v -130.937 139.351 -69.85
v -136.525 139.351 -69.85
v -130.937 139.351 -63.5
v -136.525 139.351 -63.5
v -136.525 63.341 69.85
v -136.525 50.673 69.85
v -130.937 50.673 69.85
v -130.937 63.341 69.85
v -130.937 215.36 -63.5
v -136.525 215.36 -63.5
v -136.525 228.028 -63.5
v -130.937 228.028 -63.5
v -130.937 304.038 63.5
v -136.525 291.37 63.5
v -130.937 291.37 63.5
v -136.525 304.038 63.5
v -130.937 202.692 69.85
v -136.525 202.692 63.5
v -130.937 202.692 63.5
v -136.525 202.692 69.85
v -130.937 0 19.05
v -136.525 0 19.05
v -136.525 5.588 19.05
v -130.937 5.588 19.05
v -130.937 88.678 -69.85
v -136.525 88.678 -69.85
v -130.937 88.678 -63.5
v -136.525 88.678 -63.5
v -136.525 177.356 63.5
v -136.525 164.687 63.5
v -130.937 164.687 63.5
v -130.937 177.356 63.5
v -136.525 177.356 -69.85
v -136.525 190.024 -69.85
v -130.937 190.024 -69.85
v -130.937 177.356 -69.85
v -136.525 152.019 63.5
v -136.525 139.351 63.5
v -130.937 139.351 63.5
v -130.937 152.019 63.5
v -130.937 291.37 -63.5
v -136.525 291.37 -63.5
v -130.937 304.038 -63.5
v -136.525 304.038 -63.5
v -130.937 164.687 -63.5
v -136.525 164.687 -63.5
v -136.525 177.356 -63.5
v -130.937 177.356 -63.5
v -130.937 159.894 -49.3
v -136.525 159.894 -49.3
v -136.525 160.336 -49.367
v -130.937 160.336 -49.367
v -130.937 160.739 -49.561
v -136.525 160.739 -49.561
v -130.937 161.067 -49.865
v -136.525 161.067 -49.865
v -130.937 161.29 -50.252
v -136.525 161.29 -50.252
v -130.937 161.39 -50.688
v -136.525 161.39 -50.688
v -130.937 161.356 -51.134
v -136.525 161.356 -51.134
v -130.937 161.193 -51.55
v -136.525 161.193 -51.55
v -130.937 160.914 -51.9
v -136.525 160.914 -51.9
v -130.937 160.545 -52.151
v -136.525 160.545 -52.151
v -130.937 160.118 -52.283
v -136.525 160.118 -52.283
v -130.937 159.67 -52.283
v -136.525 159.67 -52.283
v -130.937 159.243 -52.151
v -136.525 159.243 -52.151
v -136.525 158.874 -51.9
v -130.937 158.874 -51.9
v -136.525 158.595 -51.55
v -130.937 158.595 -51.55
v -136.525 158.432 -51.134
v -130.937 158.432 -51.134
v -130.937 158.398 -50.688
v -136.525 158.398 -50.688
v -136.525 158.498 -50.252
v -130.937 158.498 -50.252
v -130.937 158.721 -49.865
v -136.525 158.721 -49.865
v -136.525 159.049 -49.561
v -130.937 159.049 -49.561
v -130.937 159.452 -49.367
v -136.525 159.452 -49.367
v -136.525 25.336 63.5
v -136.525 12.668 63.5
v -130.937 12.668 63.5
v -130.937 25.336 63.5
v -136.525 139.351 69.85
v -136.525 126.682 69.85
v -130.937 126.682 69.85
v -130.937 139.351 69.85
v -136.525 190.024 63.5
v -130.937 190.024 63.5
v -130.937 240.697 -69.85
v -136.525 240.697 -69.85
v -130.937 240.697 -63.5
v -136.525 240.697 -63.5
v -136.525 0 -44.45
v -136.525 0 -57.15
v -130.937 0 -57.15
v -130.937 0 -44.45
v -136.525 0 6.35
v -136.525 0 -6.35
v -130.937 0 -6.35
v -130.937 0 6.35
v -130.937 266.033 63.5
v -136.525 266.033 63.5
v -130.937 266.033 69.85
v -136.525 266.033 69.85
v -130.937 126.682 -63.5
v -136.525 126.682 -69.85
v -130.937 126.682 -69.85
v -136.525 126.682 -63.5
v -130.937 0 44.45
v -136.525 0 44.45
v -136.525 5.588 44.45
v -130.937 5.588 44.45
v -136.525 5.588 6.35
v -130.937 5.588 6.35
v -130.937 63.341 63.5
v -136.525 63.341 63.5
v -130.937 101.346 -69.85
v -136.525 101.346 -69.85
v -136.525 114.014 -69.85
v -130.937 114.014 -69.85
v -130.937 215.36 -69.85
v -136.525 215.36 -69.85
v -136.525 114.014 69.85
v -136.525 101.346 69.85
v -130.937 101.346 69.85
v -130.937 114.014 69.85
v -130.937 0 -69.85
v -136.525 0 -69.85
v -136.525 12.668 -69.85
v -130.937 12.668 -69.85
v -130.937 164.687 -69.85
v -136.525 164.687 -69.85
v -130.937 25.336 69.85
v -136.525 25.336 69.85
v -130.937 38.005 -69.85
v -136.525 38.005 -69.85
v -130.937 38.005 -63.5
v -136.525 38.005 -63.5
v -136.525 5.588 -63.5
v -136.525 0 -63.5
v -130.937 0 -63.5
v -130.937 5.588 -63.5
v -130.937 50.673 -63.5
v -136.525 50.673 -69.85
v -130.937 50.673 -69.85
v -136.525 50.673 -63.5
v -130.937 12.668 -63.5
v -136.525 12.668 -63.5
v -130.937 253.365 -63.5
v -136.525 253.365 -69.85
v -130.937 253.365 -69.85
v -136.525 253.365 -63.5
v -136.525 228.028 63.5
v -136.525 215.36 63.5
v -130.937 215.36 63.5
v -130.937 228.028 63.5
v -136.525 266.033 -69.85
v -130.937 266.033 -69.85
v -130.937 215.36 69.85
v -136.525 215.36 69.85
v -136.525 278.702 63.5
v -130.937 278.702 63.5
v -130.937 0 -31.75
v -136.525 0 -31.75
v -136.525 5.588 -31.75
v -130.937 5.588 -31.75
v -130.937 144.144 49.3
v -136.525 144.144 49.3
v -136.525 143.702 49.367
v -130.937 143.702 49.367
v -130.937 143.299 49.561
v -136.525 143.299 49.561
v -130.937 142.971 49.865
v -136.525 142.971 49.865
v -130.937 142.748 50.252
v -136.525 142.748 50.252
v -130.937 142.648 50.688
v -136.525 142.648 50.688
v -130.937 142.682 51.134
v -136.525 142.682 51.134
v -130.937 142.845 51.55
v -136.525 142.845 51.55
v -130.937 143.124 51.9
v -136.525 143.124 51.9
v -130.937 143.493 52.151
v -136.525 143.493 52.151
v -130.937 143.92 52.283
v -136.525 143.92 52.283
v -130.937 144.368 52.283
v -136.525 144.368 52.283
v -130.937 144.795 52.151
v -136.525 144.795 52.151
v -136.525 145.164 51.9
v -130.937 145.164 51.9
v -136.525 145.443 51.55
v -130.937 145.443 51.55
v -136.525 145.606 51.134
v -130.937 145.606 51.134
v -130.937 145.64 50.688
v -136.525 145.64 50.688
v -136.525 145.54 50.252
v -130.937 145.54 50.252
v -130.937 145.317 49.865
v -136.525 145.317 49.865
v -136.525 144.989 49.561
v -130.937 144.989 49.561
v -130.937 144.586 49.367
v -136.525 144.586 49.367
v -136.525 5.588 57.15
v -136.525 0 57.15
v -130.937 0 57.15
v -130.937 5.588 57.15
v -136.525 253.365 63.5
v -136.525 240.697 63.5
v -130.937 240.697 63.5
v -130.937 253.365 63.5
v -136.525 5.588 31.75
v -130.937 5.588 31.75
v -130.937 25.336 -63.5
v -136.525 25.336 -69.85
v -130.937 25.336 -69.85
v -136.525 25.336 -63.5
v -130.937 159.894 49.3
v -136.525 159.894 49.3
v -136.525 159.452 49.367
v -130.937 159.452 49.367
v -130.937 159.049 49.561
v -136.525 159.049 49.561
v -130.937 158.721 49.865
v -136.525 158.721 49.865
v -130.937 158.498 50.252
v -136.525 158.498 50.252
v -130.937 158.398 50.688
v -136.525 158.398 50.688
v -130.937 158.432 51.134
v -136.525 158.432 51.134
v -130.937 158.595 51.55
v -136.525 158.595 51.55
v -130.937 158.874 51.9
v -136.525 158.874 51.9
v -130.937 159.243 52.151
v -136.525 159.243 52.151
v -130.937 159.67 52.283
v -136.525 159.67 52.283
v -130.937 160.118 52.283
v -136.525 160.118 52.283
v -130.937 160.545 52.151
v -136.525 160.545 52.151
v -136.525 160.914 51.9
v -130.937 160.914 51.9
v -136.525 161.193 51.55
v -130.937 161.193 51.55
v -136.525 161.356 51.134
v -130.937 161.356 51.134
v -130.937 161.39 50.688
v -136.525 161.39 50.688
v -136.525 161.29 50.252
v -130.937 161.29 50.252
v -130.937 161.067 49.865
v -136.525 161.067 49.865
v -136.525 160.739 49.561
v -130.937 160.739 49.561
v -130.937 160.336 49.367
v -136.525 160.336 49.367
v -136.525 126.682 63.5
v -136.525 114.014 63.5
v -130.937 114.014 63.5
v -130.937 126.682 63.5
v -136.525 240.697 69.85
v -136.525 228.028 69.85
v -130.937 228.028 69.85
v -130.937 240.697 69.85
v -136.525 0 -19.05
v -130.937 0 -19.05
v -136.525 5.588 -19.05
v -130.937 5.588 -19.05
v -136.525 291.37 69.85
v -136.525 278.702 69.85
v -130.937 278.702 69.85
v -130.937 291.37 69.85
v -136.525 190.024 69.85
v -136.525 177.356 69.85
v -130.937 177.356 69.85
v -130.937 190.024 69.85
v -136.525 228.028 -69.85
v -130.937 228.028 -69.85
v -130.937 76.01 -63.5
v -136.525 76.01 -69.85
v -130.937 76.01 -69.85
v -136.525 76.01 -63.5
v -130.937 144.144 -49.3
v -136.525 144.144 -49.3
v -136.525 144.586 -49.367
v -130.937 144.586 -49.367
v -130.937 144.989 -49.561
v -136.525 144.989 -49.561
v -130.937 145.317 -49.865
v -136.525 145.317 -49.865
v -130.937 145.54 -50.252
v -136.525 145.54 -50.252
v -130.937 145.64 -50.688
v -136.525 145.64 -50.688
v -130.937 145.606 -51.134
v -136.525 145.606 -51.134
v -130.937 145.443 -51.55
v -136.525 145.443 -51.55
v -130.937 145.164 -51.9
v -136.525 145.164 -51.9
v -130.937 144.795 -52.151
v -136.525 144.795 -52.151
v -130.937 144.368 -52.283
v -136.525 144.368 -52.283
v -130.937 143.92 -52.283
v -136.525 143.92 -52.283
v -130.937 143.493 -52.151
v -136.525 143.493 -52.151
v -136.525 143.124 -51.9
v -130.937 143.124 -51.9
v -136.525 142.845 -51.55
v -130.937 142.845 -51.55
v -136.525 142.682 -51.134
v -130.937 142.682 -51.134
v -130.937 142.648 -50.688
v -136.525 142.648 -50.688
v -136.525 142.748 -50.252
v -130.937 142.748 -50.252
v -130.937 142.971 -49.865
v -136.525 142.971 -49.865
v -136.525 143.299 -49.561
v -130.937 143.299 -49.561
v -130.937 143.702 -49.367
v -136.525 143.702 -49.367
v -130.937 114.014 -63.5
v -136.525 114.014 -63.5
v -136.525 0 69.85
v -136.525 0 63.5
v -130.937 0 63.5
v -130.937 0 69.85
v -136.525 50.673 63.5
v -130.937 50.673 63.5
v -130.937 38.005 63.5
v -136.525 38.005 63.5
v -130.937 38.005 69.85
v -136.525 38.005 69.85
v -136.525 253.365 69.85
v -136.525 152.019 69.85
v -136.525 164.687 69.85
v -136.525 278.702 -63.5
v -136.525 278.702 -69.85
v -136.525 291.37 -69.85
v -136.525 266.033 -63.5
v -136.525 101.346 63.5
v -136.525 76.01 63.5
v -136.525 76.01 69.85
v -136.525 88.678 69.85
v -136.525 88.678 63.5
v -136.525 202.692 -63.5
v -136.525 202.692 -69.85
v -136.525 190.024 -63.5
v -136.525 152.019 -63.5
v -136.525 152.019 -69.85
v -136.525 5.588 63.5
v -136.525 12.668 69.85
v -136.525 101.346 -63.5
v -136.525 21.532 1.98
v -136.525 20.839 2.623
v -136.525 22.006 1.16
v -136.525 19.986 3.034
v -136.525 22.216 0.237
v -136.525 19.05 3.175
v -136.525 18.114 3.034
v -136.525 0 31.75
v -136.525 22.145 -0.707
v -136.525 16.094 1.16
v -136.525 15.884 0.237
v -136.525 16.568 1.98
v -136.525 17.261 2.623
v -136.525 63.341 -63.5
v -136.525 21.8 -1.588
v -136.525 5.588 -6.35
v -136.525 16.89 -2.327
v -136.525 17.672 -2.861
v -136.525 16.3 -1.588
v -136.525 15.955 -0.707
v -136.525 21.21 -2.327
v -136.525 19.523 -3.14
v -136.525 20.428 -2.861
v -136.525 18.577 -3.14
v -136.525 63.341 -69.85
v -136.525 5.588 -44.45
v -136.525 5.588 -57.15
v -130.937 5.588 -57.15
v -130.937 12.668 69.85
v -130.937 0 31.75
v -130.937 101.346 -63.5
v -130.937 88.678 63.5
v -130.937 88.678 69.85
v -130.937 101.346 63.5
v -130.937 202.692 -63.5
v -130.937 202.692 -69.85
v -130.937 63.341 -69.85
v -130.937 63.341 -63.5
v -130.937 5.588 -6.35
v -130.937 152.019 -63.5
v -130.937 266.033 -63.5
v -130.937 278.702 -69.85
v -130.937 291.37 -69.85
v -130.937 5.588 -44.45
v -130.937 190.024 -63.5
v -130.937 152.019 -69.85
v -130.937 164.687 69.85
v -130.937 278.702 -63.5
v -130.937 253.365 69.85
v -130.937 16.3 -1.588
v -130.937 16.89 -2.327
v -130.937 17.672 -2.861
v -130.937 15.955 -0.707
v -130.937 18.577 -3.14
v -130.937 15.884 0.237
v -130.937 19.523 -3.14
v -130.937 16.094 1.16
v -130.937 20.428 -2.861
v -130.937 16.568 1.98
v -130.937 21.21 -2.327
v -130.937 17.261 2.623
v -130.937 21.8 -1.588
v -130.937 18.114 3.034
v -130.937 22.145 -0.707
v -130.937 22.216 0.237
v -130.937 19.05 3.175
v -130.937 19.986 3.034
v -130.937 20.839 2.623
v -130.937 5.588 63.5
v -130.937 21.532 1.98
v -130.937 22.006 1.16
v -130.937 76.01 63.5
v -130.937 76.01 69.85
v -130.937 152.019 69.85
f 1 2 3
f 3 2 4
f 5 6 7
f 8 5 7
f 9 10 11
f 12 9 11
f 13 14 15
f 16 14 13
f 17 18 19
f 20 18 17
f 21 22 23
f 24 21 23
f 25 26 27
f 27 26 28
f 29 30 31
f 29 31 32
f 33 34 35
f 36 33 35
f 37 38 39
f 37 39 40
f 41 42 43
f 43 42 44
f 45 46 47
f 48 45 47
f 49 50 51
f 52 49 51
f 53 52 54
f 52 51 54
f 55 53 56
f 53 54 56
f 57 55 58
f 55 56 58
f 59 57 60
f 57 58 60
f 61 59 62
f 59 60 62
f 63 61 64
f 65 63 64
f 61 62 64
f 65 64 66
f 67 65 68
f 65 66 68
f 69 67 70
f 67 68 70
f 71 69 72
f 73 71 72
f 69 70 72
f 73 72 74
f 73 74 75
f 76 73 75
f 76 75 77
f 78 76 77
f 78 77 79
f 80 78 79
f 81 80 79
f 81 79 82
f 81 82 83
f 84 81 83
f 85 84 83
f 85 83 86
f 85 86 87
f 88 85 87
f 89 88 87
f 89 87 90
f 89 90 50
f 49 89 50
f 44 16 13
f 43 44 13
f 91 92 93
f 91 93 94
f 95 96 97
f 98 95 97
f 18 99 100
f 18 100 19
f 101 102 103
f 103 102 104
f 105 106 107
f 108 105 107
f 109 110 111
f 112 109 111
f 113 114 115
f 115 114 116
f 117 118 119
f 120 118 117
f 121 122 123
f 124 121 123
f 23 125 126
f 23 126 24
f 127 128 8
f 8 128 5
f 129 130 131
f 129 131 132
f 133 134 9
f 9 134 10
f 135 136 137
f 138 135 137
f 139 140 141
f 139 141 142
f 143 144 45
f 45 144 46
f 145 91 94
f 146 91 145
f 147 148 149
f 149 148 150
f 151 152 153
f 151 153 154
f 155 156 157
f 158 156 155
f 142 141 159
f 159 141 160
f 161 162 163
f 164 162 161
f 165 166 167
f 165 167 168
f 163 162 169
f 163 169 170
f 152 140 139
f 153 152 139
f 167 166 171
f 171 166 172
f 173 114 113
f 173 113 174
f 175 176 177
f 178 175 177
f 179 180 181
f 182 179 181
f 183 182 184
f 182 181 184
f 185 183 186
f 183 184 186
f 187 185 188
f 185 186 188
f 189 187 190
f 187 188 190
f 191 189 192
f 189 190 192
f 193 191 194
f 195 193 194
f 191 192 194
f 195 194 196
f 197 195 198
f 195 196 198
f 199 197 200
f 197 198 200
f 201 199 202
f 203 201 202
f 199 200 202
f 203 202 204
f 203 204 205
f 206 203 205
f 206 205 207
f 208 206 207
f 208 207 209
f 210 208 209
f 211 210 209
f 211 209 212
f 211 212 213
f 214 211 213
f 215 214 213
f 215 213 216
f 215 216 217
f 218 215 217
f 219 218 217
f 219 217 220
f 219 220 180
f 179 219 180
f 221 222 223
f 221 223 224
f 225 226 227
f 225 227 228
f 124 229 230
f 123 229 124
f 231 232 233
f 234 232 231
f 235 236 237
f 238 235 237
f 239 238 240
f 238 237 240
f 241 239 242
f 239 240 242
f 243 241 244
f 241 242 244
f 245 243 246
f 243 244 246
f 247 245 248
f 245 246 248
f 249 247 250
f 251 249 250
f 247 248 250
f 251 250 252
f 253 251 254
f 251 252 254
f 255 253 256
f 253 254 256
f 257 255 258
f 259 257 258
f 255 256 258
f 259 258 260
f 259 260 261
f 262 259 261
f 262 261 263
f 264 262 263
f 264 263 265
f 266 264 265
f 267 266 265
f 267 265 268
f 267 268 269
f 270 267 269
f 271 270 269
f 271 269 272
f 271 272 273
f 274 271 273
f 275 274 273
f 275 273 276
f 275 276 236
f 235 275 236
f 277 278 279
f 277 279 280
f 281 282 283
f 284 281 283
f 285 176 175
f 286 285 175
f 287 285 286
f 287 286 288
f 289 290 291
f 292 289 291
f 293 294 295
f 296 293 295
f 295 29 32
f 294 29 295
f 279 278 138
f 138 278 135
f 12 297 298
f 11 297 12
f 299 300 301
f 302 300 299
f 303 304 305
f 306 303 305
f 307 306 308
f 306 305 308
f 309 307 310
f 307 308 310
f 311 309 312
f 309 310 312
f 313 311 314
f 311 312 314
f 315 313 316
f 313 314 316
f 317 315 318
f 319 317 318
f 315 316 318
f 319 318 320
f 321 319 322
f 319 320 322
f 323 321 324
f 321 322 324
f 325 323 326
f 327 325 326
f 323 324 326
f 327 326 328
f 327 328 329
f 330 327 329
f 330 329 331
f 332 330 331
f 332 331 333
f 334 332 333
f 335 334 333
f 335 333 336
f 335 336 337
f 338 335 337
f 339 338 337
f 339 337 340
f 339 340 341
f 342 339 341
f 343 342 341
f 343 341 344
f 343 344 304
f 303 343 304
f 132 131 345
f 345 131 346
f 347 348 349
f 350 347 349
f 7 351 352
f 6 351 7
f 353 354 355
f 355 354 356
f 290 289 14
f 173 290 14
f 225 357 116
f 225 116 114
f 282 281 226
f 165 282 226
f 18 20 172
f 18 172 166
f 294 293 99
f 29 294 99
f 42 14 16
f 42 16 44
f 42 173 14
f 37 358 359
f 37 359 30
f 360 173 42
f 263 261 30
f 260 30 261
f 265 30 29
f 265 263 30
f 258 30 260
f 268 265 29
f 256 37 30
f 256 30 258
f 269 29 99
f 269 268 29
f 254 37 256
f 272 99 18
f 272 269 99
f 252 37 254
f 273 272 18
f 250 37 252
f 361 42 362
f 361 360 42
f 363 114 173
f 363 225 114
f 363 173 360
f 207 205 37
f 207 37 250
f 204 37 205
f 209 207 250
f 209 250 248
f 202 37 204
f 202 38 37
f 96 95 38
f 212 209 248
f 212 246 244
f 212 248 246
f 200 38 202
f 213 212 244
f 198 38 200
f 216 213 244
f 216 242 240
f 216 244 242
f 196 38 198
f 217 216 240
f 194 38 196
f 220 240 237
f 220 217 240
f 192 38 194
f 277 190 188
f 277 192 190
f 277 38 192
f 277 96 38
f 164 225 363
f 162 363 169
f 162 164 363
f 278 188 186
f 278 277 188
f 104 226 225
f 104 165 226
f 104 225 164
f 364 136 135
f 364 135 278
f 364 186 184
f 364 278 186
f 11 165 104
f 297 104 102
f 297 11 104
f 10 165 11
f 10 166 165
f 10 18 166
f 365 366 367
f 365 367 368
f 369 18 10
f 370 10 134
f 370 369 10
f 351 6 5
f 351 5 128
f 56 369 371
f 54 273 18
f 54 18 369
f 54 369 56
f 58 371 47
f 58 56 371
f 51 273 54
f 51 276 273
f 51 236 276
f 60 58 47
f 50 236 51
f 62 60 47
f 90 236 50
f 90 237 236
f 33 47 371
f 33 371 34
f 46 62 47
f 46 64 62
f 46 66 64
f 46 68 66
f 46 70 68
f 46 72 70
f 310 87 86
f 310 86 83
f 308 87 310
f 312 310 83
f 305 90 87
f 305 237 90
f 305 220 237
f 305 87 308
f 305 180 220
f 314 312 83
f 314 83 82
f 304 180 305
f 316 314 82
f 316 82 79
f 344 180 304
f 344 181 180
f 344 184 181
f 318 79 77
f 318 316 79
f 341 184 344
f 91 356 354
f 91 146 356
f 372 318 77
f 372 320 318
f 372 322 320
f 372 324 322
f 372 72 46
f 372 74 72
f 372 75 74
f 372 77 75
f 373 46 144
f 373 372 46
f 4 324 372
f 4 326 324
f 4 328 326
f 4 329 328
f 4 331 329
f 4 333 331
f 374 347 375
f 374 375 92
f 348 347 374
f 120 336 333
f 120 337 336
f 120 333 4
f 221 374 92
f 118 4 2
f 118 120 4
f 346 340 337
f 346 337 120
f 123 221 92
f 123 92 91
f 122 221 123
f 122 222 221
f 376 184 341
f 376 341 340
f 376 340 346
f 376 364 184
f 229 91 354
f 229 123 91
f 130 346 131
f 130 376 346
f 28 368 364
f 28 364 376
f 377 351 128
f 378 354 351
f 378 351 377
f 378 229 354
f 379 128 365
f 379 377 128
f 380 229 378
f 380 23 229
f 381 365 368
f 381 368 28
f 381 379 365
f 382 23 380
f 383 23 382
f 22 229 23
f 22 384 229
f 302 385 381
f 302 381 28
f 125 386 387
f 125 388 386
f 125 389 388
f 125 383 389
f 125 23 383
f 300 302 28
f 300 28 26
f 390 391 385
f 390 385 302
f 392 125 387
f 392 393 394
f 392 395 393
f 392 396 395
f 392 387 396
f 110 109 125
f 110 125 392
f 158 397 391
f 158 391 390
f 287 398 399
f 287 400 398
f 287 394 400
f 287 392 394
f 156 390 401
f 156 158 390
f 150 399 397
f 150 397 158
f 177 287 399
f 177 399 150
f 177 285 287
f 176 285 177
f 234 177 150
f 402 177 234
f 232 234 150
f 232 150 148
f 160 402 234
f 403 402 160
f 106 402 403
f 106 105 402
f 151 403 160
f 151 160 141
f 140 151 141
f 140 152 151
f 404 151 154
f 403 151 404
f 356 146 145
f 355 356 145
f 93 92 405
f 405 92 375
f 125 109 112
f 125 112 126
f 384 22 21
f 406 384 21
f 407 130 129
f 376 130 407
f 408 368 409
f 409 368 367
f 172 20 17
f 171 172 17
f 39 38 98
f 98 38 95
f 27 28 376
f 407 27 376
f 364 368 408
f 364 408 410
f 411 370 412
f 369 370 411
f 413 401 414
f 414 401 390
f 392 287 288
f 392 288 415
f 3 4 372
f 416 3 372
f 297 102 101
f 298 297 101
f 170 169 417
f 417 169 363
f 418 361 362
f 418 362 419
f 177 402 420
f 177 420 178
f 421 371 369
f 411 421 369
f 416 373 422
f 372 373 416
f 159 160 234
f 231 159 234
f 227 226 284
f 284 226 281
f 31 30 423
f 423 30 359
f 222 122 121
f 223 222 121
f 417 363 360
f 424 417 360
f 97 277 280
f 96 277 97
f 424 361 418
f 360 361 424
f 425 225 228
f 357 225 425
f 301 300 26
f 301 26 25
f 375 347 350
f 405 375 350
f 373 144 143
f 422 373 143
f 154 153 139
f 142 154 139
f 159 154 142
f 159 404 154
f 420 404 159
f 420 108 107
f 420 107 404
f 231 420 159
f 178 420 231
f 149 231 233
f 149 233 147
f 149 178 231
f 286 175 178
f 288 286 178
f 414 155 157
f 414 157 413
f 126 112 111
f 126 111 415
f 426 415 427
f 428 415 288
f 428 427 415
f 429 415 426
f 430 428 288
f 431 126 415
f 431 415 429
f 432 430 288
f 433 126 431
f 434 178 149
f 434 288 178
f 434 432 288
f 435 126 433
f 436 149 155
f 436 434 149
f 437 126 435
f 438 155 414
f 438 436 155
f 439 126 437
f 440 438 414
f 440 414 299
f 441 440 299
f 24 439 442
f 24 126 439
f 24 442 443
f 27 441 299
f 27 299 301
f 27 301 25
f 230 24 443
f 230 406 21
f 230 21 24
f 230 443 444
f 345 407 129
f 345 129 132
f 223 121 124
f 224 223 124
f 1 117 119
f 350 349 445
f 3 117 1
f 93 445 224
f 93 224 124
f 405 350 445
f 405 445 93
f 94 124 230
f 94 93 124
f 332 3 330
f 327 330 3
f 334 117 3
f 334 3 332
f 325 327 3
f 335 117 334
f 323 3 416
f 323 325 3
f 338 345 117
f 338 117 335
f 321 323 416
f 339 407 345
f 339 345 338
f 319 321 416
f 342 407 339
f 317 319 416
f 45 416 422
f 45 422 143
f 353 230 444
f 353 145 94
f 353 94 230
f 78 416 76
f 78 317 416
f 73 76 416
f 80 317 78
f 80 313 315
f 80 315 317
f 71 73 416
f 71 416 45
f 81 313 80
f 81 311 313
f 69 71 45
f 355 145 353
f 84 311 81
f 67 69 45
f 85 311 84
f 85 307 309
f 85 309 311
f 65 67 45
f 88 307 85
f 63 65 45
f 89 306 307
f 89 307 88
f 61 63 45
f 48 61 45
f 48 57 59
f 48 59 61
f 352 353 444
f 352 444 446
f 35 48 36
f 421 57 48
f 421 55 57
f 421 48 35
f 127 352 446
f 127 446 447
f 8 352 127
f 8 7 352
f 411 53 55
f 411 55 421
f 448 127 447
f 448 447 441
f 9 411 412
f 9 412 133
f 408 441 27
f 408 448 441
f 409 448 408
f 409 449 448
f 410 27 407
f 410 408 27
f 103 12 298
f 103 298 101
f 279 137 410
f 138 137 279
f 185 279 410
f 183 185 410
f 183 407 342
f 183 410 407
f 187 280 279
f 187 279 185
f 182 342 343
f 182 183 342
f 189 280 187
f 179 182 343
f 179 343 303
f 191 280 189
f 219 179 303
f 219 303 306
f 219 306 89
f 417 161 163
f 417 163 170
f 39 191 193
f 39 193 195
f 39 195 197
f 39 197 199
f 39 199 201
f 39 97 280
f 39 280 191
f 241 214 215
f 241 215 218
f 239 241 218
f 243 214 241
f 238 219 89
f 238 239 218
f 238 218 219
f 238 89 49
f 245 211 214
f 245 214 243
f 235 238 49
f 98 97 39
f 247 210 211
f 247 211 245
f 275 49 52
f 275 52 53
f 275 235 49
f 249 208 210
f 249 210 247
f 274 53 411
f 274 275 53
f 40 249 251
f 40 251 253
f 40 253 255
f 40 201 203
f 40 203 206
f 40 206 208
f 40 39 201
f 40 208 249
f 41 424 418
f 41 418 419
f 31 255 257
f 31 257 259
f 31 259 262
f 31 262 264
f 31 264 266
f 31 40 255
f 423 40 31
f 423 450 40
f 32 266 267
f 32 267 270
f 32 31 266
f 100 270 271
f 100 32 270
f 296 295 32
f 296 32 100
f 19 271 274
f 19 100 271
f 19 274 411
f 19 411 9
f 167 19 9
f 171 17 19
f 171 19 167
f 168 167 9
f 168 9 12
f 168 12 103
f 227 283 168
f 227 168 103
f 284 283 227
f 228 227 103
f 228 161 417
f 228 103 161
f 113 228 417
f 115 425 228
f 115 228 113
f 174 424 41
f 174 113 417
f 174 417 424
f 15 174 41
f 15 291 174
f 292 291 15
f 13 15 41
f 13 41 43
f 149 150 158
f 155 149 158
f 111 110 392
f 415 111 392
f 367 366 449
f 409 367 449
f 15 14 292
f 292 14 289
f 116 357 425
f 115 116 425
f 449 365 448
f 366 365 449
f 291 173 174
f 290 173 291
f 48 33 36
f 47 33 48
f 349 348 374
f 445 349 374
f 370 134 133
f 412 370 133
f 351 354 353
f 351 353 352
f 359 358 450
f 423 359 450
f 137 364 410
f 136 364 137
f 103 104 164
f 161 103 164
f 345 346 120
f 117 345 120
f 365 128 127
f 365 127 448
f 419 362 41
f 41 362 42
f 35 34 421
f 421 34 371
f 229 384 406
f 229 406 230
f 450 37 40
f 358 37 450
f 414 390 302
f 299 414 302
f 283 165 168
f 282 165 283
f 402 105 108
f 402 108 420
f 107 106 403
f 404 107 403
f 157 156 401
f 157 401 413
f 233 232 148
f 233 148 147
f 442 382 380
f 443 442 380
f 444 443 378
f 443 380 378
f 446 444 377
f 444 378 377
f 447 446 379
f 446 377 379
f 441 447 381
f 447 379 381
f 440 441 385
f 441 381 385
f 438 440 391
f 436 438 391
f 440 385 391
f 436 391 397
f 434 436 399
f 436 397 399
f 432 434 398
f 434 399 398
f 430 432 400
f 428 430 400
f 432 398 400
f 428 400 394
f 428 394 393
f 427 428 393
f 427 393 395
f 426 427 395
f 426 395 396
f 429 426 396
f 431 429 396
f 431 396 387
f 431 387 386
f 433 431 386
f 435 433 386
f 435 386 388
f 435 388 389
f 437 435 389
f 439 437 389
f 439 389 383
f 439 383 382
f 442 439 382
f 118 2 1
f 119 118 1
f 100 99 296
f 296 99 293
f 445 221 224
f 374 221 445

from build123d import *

# Parameters (mm, degrees)
SKETCH1_W              = 273.05
SKETCH1_H              = 139.7
BOSS_EXTRUDE1_DEPTH    = 5.588
SKETCH2_W              = 273.05
SKETCH2_H              = 139.7
SKETCH2_W_2            = 261.874
SKETCH2_H_2            = 128.524
BOSS_EXTRUDE2_DEPTH    = 298.45
SKETCH3_W              = 6.35
SKETCH3_H              = 16.933333333
SKETCH3_H_2            = 16.933333334
DOOR_SLOT_DEPTH        = 12.7
DOOR_GUIDE_HOLES_REACH = 361.255
SKETCH4_W              = 6.35
SKETCH4_H              = 15.875
LEVER_HOLES_W          = 9.652
LEVER_HOLES_H          = 6.35
LEVER_HOLES_W_2        = 6.35
CUT_EXTRUDE1_DEPTH     = 362.378293578
CUT_EXTRUDE2_REACH     = 416.577
SKETCH7_R              = 26.9875
CUT_EXTRUDE3_REACH     = 416.577
SKETCH8_R              = 3.175
SKETCH8_R_2            = 1.5
SKETCH16_W             = 336.893526087
SKETCH16_H             = 314.471565403
CUT_EXTRUDE10_DEPTH    = 362.378293578
LEFT_RIGHT_W           = 6.35
LEFT_RIGHT_H           = 5.588
LEFT_RIGHT_W_2         = 12.7
LEFT_RIGHT_H_2         = 12.66825
CUT_EXTRUDE11_DEPTH    = 313.00857951


with BuildPart() as part:
    # Sketch1 → Boss-Extrude1 (new body)
    with BuildSketch(Plane(origin=(0, 0, 0), x_dir=(1, 0, 0), z_dir=(0, 1, 0))):
        Rectangle(SKETCH1_W, SKETCH1_H)
    extrude(amount=BOSS_EXTRUDE1_DEPTH)

    # Sketch2 → Boss-Extrude2 (add)
    with BuildSketch(Plane(origin=(0, 5.588, 0), x_dir=(1, 0, 0), z_dir=(0, 1, 0))):
        Rectangle(SKETCH2_W, SKETCH2_H)
        Rectangle(SKETCH2_W_2, SKETCH2_H_2, mode=Mode.SUBTRACT)
    extrude(amount=BOSS_EXTRUDE2_DEPTH)

    # Sketch3 → Door Slot (cut)
    with BuildSketch(Plane.XY.offset(69.85)):
        with BuildLine():
            Line((-29.337, 282.448), (-29.337, 5.588))
            Line((-29.337, 5.588), (-22.733, 5.588))
            Line((-22.733, 5.588), (-22.733, 291.592))
            Line((-22.733, 291.592), (-42.291, 291.592))
            Line((-42.291, 291.592), (-42.291, 284.988))
            Line((-42.291, 284.988), (-31.877, 284.988))
            ThreePointArc((-31.877, 284.988), (-30.080948776, 284.244051224), (-29.337, 282.448))
        make_face()
        with Locations((-13.208, 80.433333334)):
            Rectangle(SKETCH3_W, SKETCH3_H)
        with Locations((-13.208, 50.8)):
            Rectangle(SKETCH3_W, SKETCH3_H_2)
        with Locations((-13.208, 21.166666667)):
            Rectangle(SKETCH3_W, SKETCH3_H)
    extrude(amount=-DOOR_SLOT_DEPTH, mode=Mode.SUBTRACT)

    # Sketch4 → Door Guide Holes (cut, up to next)
    with BuildSketch(Plane.XY.offset(-64.262), mode=Mode.PRIVATE) as door_guide_holes_sk1:
        with Locations((-45.466, 283.4005)):
            Rectangle(SKETCH4_W, SKETCH4_H)
    door_guide_holes_tool1 = extrude(door_guide_holes_sk1.sketch, amount=-DOOR_GUIDE_HOLES_REACH, mode=Mode.PRIVATE) & part.part
    # Sketch4 → Door Guide Holes (cut, up to next)
    with BuildSketch(Plane.XY.offset(-64.262), mode=Mode.PRIVATE) as door_guide_holes_sk2:
        with Locations((-45.466, 254.8255)):
            Rectangle(SKETCH4_W, SKETCH4_H)
    door_guide_holes_tool2 = extrude(door_guide_holes_sk2.sketch, amount=-DOOR_GUIDE_HOLES_REACH, mode=Mode.PRIVATE) & part.part
    # Sketch4 → Door Guide Holes (cut, up to next)
    with BuildSketch(Plane.XY.offset(-64.262), mode=Mode.PRIVATE) as door_guide_holes_sk3:
        with Locations((-45.466, 226.2505)):
            Rectangle(SKETCH4_W, SKETCH4_H)
    door_guide_holes_tool3 = extrude(door_guide_holes_sk3.sketch, amount=-DOOR_GUIDE_HOLES_REACH, mode=Mode.PRIVATE) & part.part
    # Sketch4 → Door Guide Holes (cut, up to next)
    with BuildSketch(Plane.XY.offset(-64.262), mode=Mode.PRIVATE) as door_guide_holes_sk4:
        with Locations((-45.466, 197.6755)):
            Rectangle(SKETCH4_W, SKETCH4_H)
    door_guide_holes_tool4 = extrude(door_guide_holes_sk4.sketch, amount=-DOOR_GUIDE_HOLES_REACH, mode=Mode.PRIVATE) & part.part
    # Sketch4 → Door Guide Holes (cut, up to next)
    with BuildSketch(Plane.XY.offset(-64.262), mode=Mode.PRIVATE) as door_guide_holes_sk5:
        with Locations((-45.466, 169.1005)):
            Rectangle(SKETCH4_W, SKETCH4_H)
    door_guide_holes_tool5 = extrude(door_guide_holes_sk5.sketch, amount=-DOOR_GUIDE_HOLES_REACH, mode=Mode.PRIVATE) & part.part
    # Sketch4 → Door Guide Holes (cut, up to next)
    with BuildSketch(Plane.XY.offset(-64.262), mode=Mode.PRIVATE) as door_guide_holes_sk6:
        with Locations((-45.466, 140.5255)):
            Rectangle(SKETCH4_W, SKETCH4_H)
    door_guide_holes_tool6 = extrude(door_guide_holes_sk6.sketch, amount=-DOOR_GUIDE_HOLES_REACH, mode=Mode.PRIVATE) & part.part
    # Sketch4 → Door Guide Holes (cut, up to next)
    with BuildSketch(Plane.XY.offset(-64.262), mode=Mode.PRIVATE) as door_guide_holes_sk7:
        with Locations((-45.466, 111.9505)):
            Rectangle(SKETCH4_W, SKETCH4_H)
    door_guide_holes_tool7 = extrude(door_guide_holes_sk7.sketch, amount=-DOOR_GUIDE_HOLES_REACH, mode=Mode.PRIVATE) & part.part
    # Sketch4 → Door Guide Holes (cut, up to next)
    with BuildSketch(Plane.XY.offset(-64.262), mode=Mode.PRIVATE) as door_guide_holes_sk8:
        with Locations((-45.466, 83.3755)):
            Rectangle(SKETCH4_W, SKETCH4_H)
    door_guide_holes_tool8 = extrude(door_guide_holes_sk8.sketch, amount=-DOOR_GUIDE_HOLES_REACH, mode=Mode.PRIVATE) & part.part
    # Sketch4 → Door Guide Holes (cut, up to next)
    with BuildSketch(Plane.XY.offset(-64.262), mode=Mode.PRIVATE) as door_guide_holes_sk9:
        with Locations((-45.466, 54.8005)):
            Rectangle(SKETCH4_W, SKETCH4_H)
    door_guide_holes_tool9 = extrude(door_guide_holes_sk9.sketch, amount=-DOOR_GUIDE_HOLES_REACH, mode=Mode.PRIVATE) & part.part
    # Sketch4 → Door Guide Holes (cut, up to next)
    with BuildSketch(Plane.XY.offset(-64.262), mode=Mode.PRIVATE) as door_guide_holes_sk10:
        with Locations((-45.466, 26.2255)):
            Rectangle(SKETCH4_W, SKETCH4_H)
    door_guide_holes_tool10 = extrude(door_guide_holes_sk10.sketch, amount=-DOOR_GUIDE_HOLES_REACH, mode=Mode.PRIVATE) & part.part
    door_guide_holes_1 = door_guide_holes_tool1.solids().sort_by_distance((-45.466, 283.4005, -64.262))[0]
    add(door_guide_holes_1, mode=Mode.SUBTRACT)
    door_guide_holes_2 = door_guide_holes_tool2.solids().sort_by_distance((-45.466, 254.8255, -64.262))[0]
    add(door_guide_holes_2, mode=Mode.SUBTRACT)
    door_guide_holes_3 = door_guide_holes_tool3.solids().sort_by_distance((-45.466, 226.2505, -64.262))[0]
    add(door_guide_holes_3, mode=Mode.SUBTRACT)
    door_guide_holes_4 = door_guide_holes_tool4.solids().sort_by_distance((-45.466, 197.6755, -64.262))[0]
    add(door_guide_holes_4, mode=Mode.SUBTRACT)
    door_guide_holes_5 = door_guide_holes_tool5.solids().sort_by_distance((-45.466, 169.1005, -64.262))[0]
    add(door_guide_holes_5, mode=Mode.SUBTRACT)
    door_guide_holes_6 = door_guide_holes_tool6.solids().sort_by_distance((-45.466, 140.5255, -64.262))[0]
    add(door_guide_holes_6, mode=Mode.SUBTRACT)
    door_guide_holes_7 = door_guide_holes_tool7.solids().sort_by_distance((-45.466, 111.9505, -64.262))[0]
    add(door_guide_holes_7, mode=Mode.SUBTRACT)
    door_guide_holes_8 = door_guide_holes_tool8.solids().sort_by_distance((-45.466, 83.3755, -64.262))[0]
    add(door_guide_holes_8, mode=Mode.SUBTRACT)
    door_guide_holes_9 = door_guide_holes_tool9.solids().sort_by_distance((-45.466, 54.8005, -64.262))[0]
    add(door_guide_holes_9, mode=Mode.SUBTRACT)
    door_guide_holes_10 = door_guide_holes_tool10.solids().sort_by_distance((-45.466, 26.2255, -64.262))[0]
    add(door_guide_holes_10, mode=Mode.SUBTRACT)
    door_guide_holes = door_guide_holes_1 + door_guide_holes_2 + door_guide_holes_3 + door_guide_holes_4 + door_guide_holes_5 + door_guide_holes_6 + door_guide_holes_7 + door_guide_holes_8 + door_guide_holes_9 + door_guide_holes_10  # Door Guide Holes as one shape, for the pattern or mirror that repeats it

    # Mirror1: Door Guide Holes across plane
    add(door_guide_holes.mirror(Plane.ZY.offset(32.512)), mode=Mode.SUBTRACT)

    # Lever Holes → Cut-Extrude1 (cut, through all)
    with BuildSketch(Plane.XY.offset(69.85)):
        with Locations((54.102, 28.575)):
            Rectangle(LEVER_HOLES_W, LEVER_HOLES_H)
        with Locations((39.3065, 15.875)):
            Rectangle(LEVER_HOLES_W_2, LEVER_HOLES_H)
        with Locations((68.8975, 15.875)):
            Rectangle(LEVER_HOLES_W_2, LEVER_HOLES_H)
    extrude(amount=-CUT_EXTRUDE1_DEPTH, mode=Mode.SUBTRACT)

    # Sketch7 → Cut-Extrude2 (cut, up to next)
    with BuildSketch(Plane(origin=(136.525, 0, 0), x_dir=(0, 0, -1), z_dir=(1, 0, 0)), mode=Mode.PRIVATE) as cut_extrude2_sk1:
        with Locations((0, 55.372)):
            Circle(SKETCH7_R)
    cut_extrude2_tool1 = extrude(cut_extrude2_sk1.sketch, amount=-CUT_EXTRUDE2_REACH, mode=Mode.PRIVATE) & part.part
    # Sketch7 → Cut-Extrude2 (cut, up to next)
    with BuildSketch(Plane(origin=(136.525, 0, 0), x_dir=(0, 0, -1), z_dir=(1, 0, 0)), mode=Mode.PRIVATE) as cut_extrude2_sk2:
        with BuildLine():
            Line((-37.211, 89.408), (-37.211, 92.583))
            Line((-37.211, 92.583), (-34.036, 92.583))
            ThreePointArc((-34.036, 92.583), (-39.45606403, 94.82806403), (-37.211, 89.408))
        make_face()
    cut_extrude2_tool2 = extrude(cut_extrude2_sk2.sketch, amount=-CUT_EXTRUDE2_REACH, mode=Mode.PRIVATE) & part.part
    # Sketch7 → Cut-Extrude2 (cut, up to next)
    with BuildSketch(Plane(origin=(136.525, 0, 0), x_dir=(0, 0, -1), z_dir=(1, 0, 0)), mode=Mode.PRIVATE) as cut_extrude2_sk3:
        with BuildLine():
            Line((-34.036, 92.583), (-37.211, 92.583))
            Line((-37.211, 92.583), (-37.211, 89.408))
            ThreePointArc((-37.211, 89.408), (-34.96593597, 90.33793597), (-34.036, 92.583))
        make_face()
    cut_extrude2_tool3 = extrude(cut_extrude2_sk3.sketch, amount=-CUT_EXTRUDE2_REACH, mode=Mode.PRIVATE) & part.part
    # Sketch7 → Cut-Extrude2 (cut, up to next)
    with BuildSketch(Plane(origin=(136.525, 0, 0), x_dir=(0, 0, -1), z_dir=(1, 0, 0)), mode=Mode.PRIVATE) as cut_extrude2_sk4:
        with BuildLine():
            Line((-37.211, 89.408), (-37.211, 92.583))
            Line((-37.211, 92.583), (-34.036, 92.583))
            ThreePointArc((-34.036, 92.583), (-39.45606403, 94.82806403), (-37.211, 89.408))
        make_face()
    cut_extrude2_tool4 = extrude(cut_extrude2_sk4.sketch, amount=-CUT_EXTRUDE2_REACH, mode=Mode.PRIVATE) & part.part
    # Sketch7 → Cut-Extrude2 (cut, up to next)
    with BuildSketch(Plane(origin=(136.525, 0, 0), x_dir=(0, 0, -1), z_dir=(1, 0, 0)), mode=Mode.PRIVATE) as cut_extrude2_sk5:
        with BuildLine():
            Line((-34.036, 92.583), (-37.211, 92.583))
            Line((-37.211, 92.583), (-37.211, 89.408))
            ThreePointArc((-37.211, 89.408), (-34.96593597, 90.33793597), (-34.036, 92.583))
        make_face()
    cut_extrude2_tool5 = extrude(cut_extrude2_sk5.sketch, amount=-CUT_EXTRUDE2_REACH, mode=Mode.PRIVATE) & part.part
    # Sketch7 → Cut-Extrude2 (cut, up to next)
    with BuildSketch(Plane(origin=(136.525, 0, 0), x_dir=(0, 0, -1), z_dir=(1, 0, 0)), mode=Mode.PRIVATE) as cut_extrude2_sk6:
        with BuildLine():
            ThreePointArc((40.386, 92.583), (37.211, 95.758), (34.036, 92.583))
            Line((34.036, 92.583), (37.211, 92.583))
            Line((37.211, 92.583), (37.211, 89.408))
            ThreePointArc((37.211, 89.408), (39.45606403, 90.33793597), (40.386, 92.583))
        make_face()
    cut_extrude2_tool6 = extrude(cut_extrude2_sk6.sketch, amount=-CUT_EXTRUDE2_REACH, mode=Mode.PRIVATE) & part.part
    # Sketch7 → Cut-Extrude2 (cut, up to next)
    with BuildSketch(Plane(origin=(136.525, 0, 0), x_dir=(0, 0, -1), z_dir=(1, 0, 0)), mode=Mode.PRIVATE) as cut_extrude2_sk7:
        with BuildLine():
            Line((37.211, 92.583), (34.036, 92.583))
            ThreePointArc((34.036, 92.583), (34.96593597, 90.33793597), (37.211, 89.408))
            Line((37.211, 89.408), (37.211, 92.583))
        make_face()
    cut_extrude2_tool7 = extrude(cut_extrude2_sk7.sketch, amount=-CUT_EXTRUDE2_REACH, mode=Mode.PRIVATE) & part.part
    # Sketch7 → Cut-Extrude2 (cut, up to next)
    with BuildSketch(Plane(origin=(136.525, 0, 0), x_dir=(0, 0, -1), z_dir=(1, 0, 0)), mode=Mode.PRIVATE) as cut_extrude2_sk8:
        with BuildLine():
            ThreePointArc((40.386, 92.583), (37.211, 95.758), (34.036, 92.583))
            Line((34.036, 92.583), (37.211, 92.583))
            Line((37.211, 92.583), (37.211, 89.408))
            ThreePointArc((37.211, 89.408), (39.45606403, 90.33793597), (40.386, 92.583))
        make_face()
    cut_extrude2_tool8 = extrude(cut_extrude2_sk8.sketch, amount=-CUT_EXTRUDE2_REACH, mode=Mode.PRIVATE) & part.part
    # Sketch7 → Cut-Extrude2 (cut, up to next)
    with BuildSketch(Plane(origin=(136.525, 0, 0), x_dir=(0, 0, -1), z_dir=(1, 0, 0)), mode=Mode.PRIVATE) as cut_extrude2_sk9:
        with BuildLine():
            Line((37.211, 92.583), (34.036, 92.583))
            ThreePointArc((34.036, 92.583), (34.96593597, 90.33793597), (37.211, 89.408))
            Line((37.211, 89.408), (37.211, 92.583))
        make_face()
    cut_extrude2_tool9 = extrude(cut_extrude2_sk9.sketch, amount=-CUT_EXTRUDE2_REACH, mode=Mode.PRIVATE) & part.part
    # Sketch7 → Cut-Extrude2 (cut, up to next)
    with BuildSketch(Plane(origin=(136.525, 0, 0), x_dir=(0, 0, -1), z_dir=(1, 0, 0)), mode=Mode.PRIVATE) as cut_extrude2_sk10:
        with BuildLine():
            ThreePointArc((-34.036, 18.161), (-34.96593597, 20.40606403), (-37.211, 21.336))
            Line((-37.211, 21.336), (-37.211, 18.161))
            Line((-37.211, 18.161), (-34.036, 18.161))
        make_face()
    cut_extrude2_tool10 = extrude(cut_extrude2_sk10.sketch, amount=-CUT_EXTRUDE2_REACH, mode=Mode.PRIVATE) & part.part
    # Sketch7 → Cut-Extrude2 (cut, up to next)
    with BuildSketch(Plane(origin=(136.525, 0, 0), x_dir=(0, 0, -1), z_dir=(1, 0, 0)), mode=Mode.PRIVATE) as cut_extrude2_sk11:
        with BuildLine():
            Line((-37.211, 18.161), (-37.211, 21.336))
            ThreePointArc((-37.211, 21.336), (-39.45606403, 15.91593597), (-34.036, 18.161))
            Line((-34.036, 18.161), (-37.211, 18.161))
        make_face()
    cut_extrude2_tool11 = extrude(cut_extrude2_sk11.sketch, amount=-CUT_EXTRUDE2_REACH, mode=Mode.PRIVATE) & part.part
    # Sketch7 → Cut-Extrude2 (cut, up to next)
    with BuildSketch(Plane(origin=(136.525, 0, 0), x_dir=(0, 0, -1), z_dir=(1, 0, 0)), mode=Mode.PRIVATE) as cut_extrude2_sk12:
        with BuildLine():
            ThreePointArc((-34.036, 18.161), (-34.96593597, 20.40606403), (-37.211, 21.336))
            Line((-37.211, 21.336), (-37.211, 18.161))
            Line((-37.211, 18.161), (-34.036, 18.161))
        make_face()
    cut_extrude2_tool12 = extrude(cut_extrude2_sk12.sketch, amount=-CUT_EXTRUDE2_REACH, mode=Mode.PRIVATE) & part.part
    # Sketch7 → Cut-Extrude2 (cut, up to next)
    with BuildSketch(Plane(origin=(136.525, 0, 0), x_dir=(0, 0, -1), z_dir=(1, 0, 0)), mode=Mode.PRIVATE) as cut_extrude2_sk13:
        with BuildLine():
            Line((-37.211, 18.161), (-37.211, 21.336))
            ThreePointArc((-37.211, 21.336), (-39.45606403, 15.91593597), (-34.036, 18.161))
            Line((-34.036, 18.161), (-37.211, 18.161))
        make_face()
    cut_extrude2_tool13 = extrude(cut_extrude2_sk13.sketch, amount=-CUT_EXTRUDE2_REACH, mode=Mode.PRIVATE) & part.part
    # Sketch7 → Cut-Extrude2 (cut, up to next)
    with BuildSketch(Plane(origin=(136.525, 0, 0), x_dir=(0, 0, -1), z_dir=(1, 0, 0)), mode=Mode.PRIVATE) as cut_extrude2_sk14:
        with BuildLine():
            ThreePointArc((40.386, 18.161), (39.45606403, 20.40606403), (37.211, 21.336))
            Line((37.211, 21.336), (37.211, 18.161))
            Line((37.211, 18.161), (34.036, 18.161))
            ThreePointArc((34.036, 18.161), (37.211, 14.986), (40.386, 18.161))
        make_face()
    cut_extrude2_tool14 = extrude(cut_extrude2_sk14.sketch, amount=-CUT_EXTRUDE2_REACH, mode=Mode.PRIVATE) & part.part
    # Sketch7 → Cut-Extrude2 (cut, up to next)
    with BuildSketch(Plane(origin=(136.525, 0, 0), x_dir=(0, 0, -1), z_dir=(1, 0, 0)), mode=Mode.PRIVATE) as cut_extrude2_sk15:
        with BuildLine():
            Line((37.211, 18.161), (37.211, 21.336))
            ThreePointArc((37.211, 21.336), (34.96593597, 20.40606403), (34.036, 18.161))
            Line((34.036, 18.161), (37.211, 18.161))
        make_face()
    cut_extrude2_tool15 = extrude(cut_extrude2_sk15.sketch, amount=-CUT_EXTRUDE2_REACH, mode=Mode.PRIVATE) & part.part
    # Sketch7 → Cut-Extrude2 (cut, up to next)
    with BuildSketch(Plane(origin=(136.525, 0, 0), x_dir=(0, 0, -1), z_dir=(1, 0, 0)), mode=Mode.PRIVATE) as cut_extrude2_sk16:
        with BuildLine():
            ThreePointArc((40.386, 18.161), (39.45606403, 20.40606403), (37.211, 21.336))
            Line((37.211, 21.336), (37.211, 18.161))
            Line((37.211, 18.161), (34.036, 18.161))
            ThreePointArc((34.036, 18.161), (37.211, 14.986), (40.386, 18.161))
        make_face()
    cut_extrude2_tool16 = extrude(cut_extrude2_sk16.sketch, amount=-CUT_EXTRUDE2_REACH, mode=Mode.PRIVATE) & part.part
    # Sketch7 → Cut-Extrude2 (cut, up to next)
    with BuildSketch(Plane(origin=(136.525, 0, 0), x_dir=(0, 0, -1), z_dir=(1, 0, 0)), mode=Mode.PRIVATE) as cut_extrude2_sk17:
        with BuildLine():
            Line((37.211, 18.161), (37.211, 21.336))
            ThreePointArc((37.211, 21.336), (34.96593597, 20.40606403), (34.036, 18.161))
            Line((34.036, 18.161), (37.211, 18.161))
        make_face()
    cut_extrude2_tool17 = extrude(cut_extrude2_sk17.sketch, amount=-CUT_EXTRUDE2_REACH, mode=Mode.PRIVATE) & part.part
    add(cut_extrude2_tool1.solids().sort_by_distance((136.525, 55.372, 0))[0], mode=Mode.SUBTRACT)
    add(cut_extrude2_tool2.solids().sort_by_distance((136.525, 93.032171, 37.660171))[0], mode=Mode.SUBTRACT)
    add(cut_extrude2_tool3.solids().sort_by_distance((136.525, 91.235488, 35.863488))[0], mode=Mode.SUBTRACT)
    add(cut_extrude2_tool4.solids().sort_by_distance((136.525, 93.032171, 37.660171))[0], mode=Mode.SUBTRACT)
    add(cut_extrude2_tool5.solids().sort_by_distance((136.525, 91.235488, 35.863488))[0], mode=Mode.SUBTRACT)
    add(cut_extrude2_tool6.solids().sort_by_distance((136.525, 93.032171, -37.660171))[0], mode=Mode.SUBTRACT)
    add(cut_extrude2_tool7.solids().sort_by_distance((136.525, 91.235488, -35.863488))[0], mode=Mode.SUBTRACT)
    add(cut_extrude2_tool8.solids().sort_by_distance((136.525, 93.032171, -37.660171))[0], mode=Mode.SUBTRACT)
    add(cut_extrude2_tool9.solids().sort_by_distance((136.525, 91.235488, -35.863488))[0], mode=Mode.SUBTRACT)
    add(cut_extrude2_tool10.solids().sort_by_distance((136.525, 19.508512, 35.863488))[0], mode=Mode.SUBTRACT)
    add(cut_extrude2_tool11.solids().sort_by_distance((136.525, 17.711829, 37.660171))[0], mode=Mode.SUBTRACT)
    add(cut_extrude2_tool12.solids().sort_by_distance((136.525, 19.508512, 35.863488))[0], mode=Mode.SUBTRACT)
    add(cut_extrude2_tool13.solids().sort_by_distance((136.525, 17.711829, 37.660171))[0], mode=Mode.SUBTRACT)
    add(cut_extrude2_tool14.solids().sort_by_distance((136.525, 17.711829, -37.660171))[0], mode=Mode.SUBTRACT)
    add(cut_extrude2_tool15.solids().sort_by_distance((136.525, 19.508512, -35.863488))[0], mode=Mode.SUBTRACT)
    add(cut_extrude2_tool16.solids().sort_by_distance((136.525, 17.711829, -37.660171))[0], mode=Mode.SUBTRACT)
    add(cut_extrude2_tool17.solids().sort_by_distance((136.525, 19.508512, -35.863488))[0], mode=Mode.SUBTRACT)

    # Sketch8 → Cut-Extrude3 (cut, up to next)
    with BuildSketch(Plane.ZY.offset(136.525), mode=Mode.PRIVATE) as cut_extrude3_sk1:
        with Locations((0, 19.05)):
            Circle(SKETCH8_R)
    cut_extrude3_tool1 = extrude(cut_extrude3_sk1.sketch, amount=-CUT_EXTRUDE3_REACH, mode=Mode.PRIVATE) & part.part
    # Sketch8 → Cut-Extrude3 (cut, up to next)
    with BuildSketch(Plane.ZY.offset(136.525), mode=Mode.PRIVATE) as cut_extrude3_sk2:
        with Locations((-50.8, 159.894)):
            Circle(SKETCH8_R_2)
    cut_extrude3_tool2 = extrude(cut_extrude3_sk2.sketch, amount=-CUT_EXTRUDE3_REACH, mode=Mode.PRIVATE) & part.part
    # Sketch8 → Cut-Extrude3 (cut, up to next)
    with BuildSketch(Plane.ZY.offset(136.525), mode=Mode.PRIVATE) as cut_extrude3_sk3:
        with Locations((-50.8, 144.144)):
            Circle(SKETCH8_R_2)
    cut_extrude3_tool3 = extrude(cut_extrude3_sk3.sketch, amount=-CUT_EXTRUDE3_REACH, mode=Mode.PRIVATE) & part.part
    # Sketch8 → Cut-Extrude3 (cut, up to next)
    with BuildSketch(Plane.ZY.offset(136.525), mode=Mode.PRIVATE) as cut_extrude3_sk4:
        with Locations(Location((50.8, 144.144, 0), (0, 0, 180))):
            Circle(SKETCH8_R_2)
    cut_extrude3_tool4 = extrude(cut_extrude3_sk4.sketch, amount=-CUT_EXTRUDE3_REACH, mode=Mode.PRIVATE) & part.part
    # Sketch8 → Cut-Extrude3 (cut, up to next)
    with BuildSketch(Plane.ZY.offset(136.525), mode=Mode.PRIVATE) as cut_extrude3_sk5:
        with Locations(Location((50.8, 159.894, 0), (0, 0, 180))):
            Circle(SKETCH8_R_2)
    cut_extrude3_tool5 = extrude(cut_extrude3_sk5.sketch, amount=-CUT_EXTRUDE3_REACH, mode=Mode.PRIVATE) & part.part
    add(cut_extrude3_tool1.solids().sort_by_distance((-136.525, 19.05, 0))[0], mode=Mode.SUBTRACT)
    add(cut_extrude3_tool2.solids().sort_by_distance((-136.525, 159.894, -50.8))[0], mode=Mode.SUBTRACT)
    add(cut_extrude3_tool3.solids().sort_by_distance((-136.525, 144.144, -50.8))[0], mode=Mode.SUBTRACT)
    add(cut_extrude3_tool4.solids().sort_by_distance((-136.525, 144.144, 50.8))[0], mode=Mode.SUBTRACT)
    add(cut_extrude3_tool5.solids().sort_by_distance((-136.525, 159.894, 50.8))[0], mode=Mode.SUBTRACT)

    # Sketch16 → Cut-Extrude10 (cut, through all)
    with BuildSketch(Plane.XY.offset(69.85)):
        with Locations((37.509763044, 146.802217299)):
            Rectangle(SKETCH16_W, SKETCH16_H)
    extrude(amount=-CUT_EXTRUDE10_DEPTH, mode=Mode.SUBTRACT)

    # Left/Right → Cut-Extrude11 (cut, through all)
    with BuildSketch(Plane.ZY.offset(136.525)):
        with Locations((60.325, 2.794)):
            Rectangle(LEFT_RIGHT_W, LEFT_RIGHT_H)
        with Locations((38.1, 2.794)):
            Rectangle(LEFT_RIGHT_W_2, LEFT_RIGHT_H)
        with Locations((66.675, 19.002375)):
            Rectangle(LEFT_RIGHT_W, LEFT_RIGHT_H_2)
        with Locations((12.7, 2.794)):
            Rectangle(LEFT_RIGHT_W_2, LEFT_RIGHT_H)
        with Locations((66.675, 44.338875)):
            Rectangle(LEFT_RIGHT_W, LEFT_RIGHT_H_2)
        with Locations((-12.7, 2.794)):
            Rectangle(LEFT_RIGHT_W_2, LEFT_RIGHT_H)
        with Locations((66.675, 69.675375)):
            Rectangle(LEFT_RIGHT_W, LEFT_RIGHT_H_2)
        with Locations((-38.1, 2.794)):
            Rectangle(LEFT_RIGHT_W_2, LEFT_RIGHT_H)
        with Locations((66.675, 95.011875)):
            Rectangle(LEFT_RIGHT_W, LEFT_RIGHT_H_2)
        with Locations((-60.325, 2.794)):
            Rectangle(LEFT_RIGHT_W, LEFT_RIGHT_H)
        with Locations((66.675, 120.348375)):
            Rectangle(LEFT_RIGHT_W, LEFT_RIGHT_H_2)
        with Locations((-66.675, 19.002375)):
            Rectangle(LEFT_RIGHT_W, LEFT_RIGHT_H_2)
        with Locations((66.675, 145.684875)):
            Rectangle(LEFT_RIGHT_W, LEFT_RIGHT_H_2)
        with Locations((-66.675, 44.338875)):
            Rectangle(LEFT_RIGHT_W, LEFT_RIGHT_H_2)
        with Locations((66.675, 171.021375)):
            Rectangle(LEFT_RIGHT_W, LEFT_RIGHT_H_2)
        with Locations((-66.675, 69.675375)):
            Rectangle(LEFT_RIGHT_W, LEFT_RIGHT_H_2)
        with Locations((66.675, 196.357875)):
            Rectangle(LEFT_RIGHT_W, LEFT_RIGHT_H_2)
        with Locations((-66.675, 95.011875)):
            Rectangle(LEFT_RIGHT_W, LEFT_RIGHT_H_2)
        with Locations((66.675, 221.694375)):
            Rectangle(LEFT_RIGHT_W, LEFT_RIGHT_H_2)
        with Locations((-66.675, 120.348375)):
            Rectangle(LEFT_RIGHT_W, LEFT_RIGHT_H_2)
        with Locations((66.675, 247.030875)):
            Rectangle(LEFT_RIGHT_W, LEFT_RIGHT_H_2)
        with Locations((-66.675, 145.684875)):
            Rectangle(LEFT_RIGHT_W, LEFT_RIGHT_H_2)
        with Locations((66.675, 272.367375)):
            Rectangle(LEFT_RIGHT_W, LEFT_RIGHT_H_2)
        with Locations((-66.675, 171.021375)):
            Rectangle(LEFT_RIGHT_W, LEFT_RIGHT_H_2)
        with Locations((66.675, 297.703875)):
            Rectangle(LEFT_RIGHT_W, LEFT_RIGHT_H_2)
        with Locations((-66.675, 196.357875)):
            Rectangle(LEFT_RIGHT_W, LEFT_RIGHT_H_2)
        with Locations((-66.675, 221.694375)):
            Rectangle(LEFT_RIGHT_W, LEFT_RIGHT_H_2)
        with Locations((-66.675, 247.030875)):
            Rectangle(LEFT_RIGHT_W, LEFT_RIGHT_H_2)
        with Locations((-66.675, 272.367375)):
            Rectangle(LEFT_RIGHT_W, LEFT_RIGHT_H_2)
        with Locations((-66.675, 297.703875)):
            Rectangle(LEFT_RIGHT_W, LEFT_RIGHT_H_2)
    extrude(amount=-CUT_EXTRUDE11_DEPTH, mode=Mode.SUBTRACT)


solid = part.part
